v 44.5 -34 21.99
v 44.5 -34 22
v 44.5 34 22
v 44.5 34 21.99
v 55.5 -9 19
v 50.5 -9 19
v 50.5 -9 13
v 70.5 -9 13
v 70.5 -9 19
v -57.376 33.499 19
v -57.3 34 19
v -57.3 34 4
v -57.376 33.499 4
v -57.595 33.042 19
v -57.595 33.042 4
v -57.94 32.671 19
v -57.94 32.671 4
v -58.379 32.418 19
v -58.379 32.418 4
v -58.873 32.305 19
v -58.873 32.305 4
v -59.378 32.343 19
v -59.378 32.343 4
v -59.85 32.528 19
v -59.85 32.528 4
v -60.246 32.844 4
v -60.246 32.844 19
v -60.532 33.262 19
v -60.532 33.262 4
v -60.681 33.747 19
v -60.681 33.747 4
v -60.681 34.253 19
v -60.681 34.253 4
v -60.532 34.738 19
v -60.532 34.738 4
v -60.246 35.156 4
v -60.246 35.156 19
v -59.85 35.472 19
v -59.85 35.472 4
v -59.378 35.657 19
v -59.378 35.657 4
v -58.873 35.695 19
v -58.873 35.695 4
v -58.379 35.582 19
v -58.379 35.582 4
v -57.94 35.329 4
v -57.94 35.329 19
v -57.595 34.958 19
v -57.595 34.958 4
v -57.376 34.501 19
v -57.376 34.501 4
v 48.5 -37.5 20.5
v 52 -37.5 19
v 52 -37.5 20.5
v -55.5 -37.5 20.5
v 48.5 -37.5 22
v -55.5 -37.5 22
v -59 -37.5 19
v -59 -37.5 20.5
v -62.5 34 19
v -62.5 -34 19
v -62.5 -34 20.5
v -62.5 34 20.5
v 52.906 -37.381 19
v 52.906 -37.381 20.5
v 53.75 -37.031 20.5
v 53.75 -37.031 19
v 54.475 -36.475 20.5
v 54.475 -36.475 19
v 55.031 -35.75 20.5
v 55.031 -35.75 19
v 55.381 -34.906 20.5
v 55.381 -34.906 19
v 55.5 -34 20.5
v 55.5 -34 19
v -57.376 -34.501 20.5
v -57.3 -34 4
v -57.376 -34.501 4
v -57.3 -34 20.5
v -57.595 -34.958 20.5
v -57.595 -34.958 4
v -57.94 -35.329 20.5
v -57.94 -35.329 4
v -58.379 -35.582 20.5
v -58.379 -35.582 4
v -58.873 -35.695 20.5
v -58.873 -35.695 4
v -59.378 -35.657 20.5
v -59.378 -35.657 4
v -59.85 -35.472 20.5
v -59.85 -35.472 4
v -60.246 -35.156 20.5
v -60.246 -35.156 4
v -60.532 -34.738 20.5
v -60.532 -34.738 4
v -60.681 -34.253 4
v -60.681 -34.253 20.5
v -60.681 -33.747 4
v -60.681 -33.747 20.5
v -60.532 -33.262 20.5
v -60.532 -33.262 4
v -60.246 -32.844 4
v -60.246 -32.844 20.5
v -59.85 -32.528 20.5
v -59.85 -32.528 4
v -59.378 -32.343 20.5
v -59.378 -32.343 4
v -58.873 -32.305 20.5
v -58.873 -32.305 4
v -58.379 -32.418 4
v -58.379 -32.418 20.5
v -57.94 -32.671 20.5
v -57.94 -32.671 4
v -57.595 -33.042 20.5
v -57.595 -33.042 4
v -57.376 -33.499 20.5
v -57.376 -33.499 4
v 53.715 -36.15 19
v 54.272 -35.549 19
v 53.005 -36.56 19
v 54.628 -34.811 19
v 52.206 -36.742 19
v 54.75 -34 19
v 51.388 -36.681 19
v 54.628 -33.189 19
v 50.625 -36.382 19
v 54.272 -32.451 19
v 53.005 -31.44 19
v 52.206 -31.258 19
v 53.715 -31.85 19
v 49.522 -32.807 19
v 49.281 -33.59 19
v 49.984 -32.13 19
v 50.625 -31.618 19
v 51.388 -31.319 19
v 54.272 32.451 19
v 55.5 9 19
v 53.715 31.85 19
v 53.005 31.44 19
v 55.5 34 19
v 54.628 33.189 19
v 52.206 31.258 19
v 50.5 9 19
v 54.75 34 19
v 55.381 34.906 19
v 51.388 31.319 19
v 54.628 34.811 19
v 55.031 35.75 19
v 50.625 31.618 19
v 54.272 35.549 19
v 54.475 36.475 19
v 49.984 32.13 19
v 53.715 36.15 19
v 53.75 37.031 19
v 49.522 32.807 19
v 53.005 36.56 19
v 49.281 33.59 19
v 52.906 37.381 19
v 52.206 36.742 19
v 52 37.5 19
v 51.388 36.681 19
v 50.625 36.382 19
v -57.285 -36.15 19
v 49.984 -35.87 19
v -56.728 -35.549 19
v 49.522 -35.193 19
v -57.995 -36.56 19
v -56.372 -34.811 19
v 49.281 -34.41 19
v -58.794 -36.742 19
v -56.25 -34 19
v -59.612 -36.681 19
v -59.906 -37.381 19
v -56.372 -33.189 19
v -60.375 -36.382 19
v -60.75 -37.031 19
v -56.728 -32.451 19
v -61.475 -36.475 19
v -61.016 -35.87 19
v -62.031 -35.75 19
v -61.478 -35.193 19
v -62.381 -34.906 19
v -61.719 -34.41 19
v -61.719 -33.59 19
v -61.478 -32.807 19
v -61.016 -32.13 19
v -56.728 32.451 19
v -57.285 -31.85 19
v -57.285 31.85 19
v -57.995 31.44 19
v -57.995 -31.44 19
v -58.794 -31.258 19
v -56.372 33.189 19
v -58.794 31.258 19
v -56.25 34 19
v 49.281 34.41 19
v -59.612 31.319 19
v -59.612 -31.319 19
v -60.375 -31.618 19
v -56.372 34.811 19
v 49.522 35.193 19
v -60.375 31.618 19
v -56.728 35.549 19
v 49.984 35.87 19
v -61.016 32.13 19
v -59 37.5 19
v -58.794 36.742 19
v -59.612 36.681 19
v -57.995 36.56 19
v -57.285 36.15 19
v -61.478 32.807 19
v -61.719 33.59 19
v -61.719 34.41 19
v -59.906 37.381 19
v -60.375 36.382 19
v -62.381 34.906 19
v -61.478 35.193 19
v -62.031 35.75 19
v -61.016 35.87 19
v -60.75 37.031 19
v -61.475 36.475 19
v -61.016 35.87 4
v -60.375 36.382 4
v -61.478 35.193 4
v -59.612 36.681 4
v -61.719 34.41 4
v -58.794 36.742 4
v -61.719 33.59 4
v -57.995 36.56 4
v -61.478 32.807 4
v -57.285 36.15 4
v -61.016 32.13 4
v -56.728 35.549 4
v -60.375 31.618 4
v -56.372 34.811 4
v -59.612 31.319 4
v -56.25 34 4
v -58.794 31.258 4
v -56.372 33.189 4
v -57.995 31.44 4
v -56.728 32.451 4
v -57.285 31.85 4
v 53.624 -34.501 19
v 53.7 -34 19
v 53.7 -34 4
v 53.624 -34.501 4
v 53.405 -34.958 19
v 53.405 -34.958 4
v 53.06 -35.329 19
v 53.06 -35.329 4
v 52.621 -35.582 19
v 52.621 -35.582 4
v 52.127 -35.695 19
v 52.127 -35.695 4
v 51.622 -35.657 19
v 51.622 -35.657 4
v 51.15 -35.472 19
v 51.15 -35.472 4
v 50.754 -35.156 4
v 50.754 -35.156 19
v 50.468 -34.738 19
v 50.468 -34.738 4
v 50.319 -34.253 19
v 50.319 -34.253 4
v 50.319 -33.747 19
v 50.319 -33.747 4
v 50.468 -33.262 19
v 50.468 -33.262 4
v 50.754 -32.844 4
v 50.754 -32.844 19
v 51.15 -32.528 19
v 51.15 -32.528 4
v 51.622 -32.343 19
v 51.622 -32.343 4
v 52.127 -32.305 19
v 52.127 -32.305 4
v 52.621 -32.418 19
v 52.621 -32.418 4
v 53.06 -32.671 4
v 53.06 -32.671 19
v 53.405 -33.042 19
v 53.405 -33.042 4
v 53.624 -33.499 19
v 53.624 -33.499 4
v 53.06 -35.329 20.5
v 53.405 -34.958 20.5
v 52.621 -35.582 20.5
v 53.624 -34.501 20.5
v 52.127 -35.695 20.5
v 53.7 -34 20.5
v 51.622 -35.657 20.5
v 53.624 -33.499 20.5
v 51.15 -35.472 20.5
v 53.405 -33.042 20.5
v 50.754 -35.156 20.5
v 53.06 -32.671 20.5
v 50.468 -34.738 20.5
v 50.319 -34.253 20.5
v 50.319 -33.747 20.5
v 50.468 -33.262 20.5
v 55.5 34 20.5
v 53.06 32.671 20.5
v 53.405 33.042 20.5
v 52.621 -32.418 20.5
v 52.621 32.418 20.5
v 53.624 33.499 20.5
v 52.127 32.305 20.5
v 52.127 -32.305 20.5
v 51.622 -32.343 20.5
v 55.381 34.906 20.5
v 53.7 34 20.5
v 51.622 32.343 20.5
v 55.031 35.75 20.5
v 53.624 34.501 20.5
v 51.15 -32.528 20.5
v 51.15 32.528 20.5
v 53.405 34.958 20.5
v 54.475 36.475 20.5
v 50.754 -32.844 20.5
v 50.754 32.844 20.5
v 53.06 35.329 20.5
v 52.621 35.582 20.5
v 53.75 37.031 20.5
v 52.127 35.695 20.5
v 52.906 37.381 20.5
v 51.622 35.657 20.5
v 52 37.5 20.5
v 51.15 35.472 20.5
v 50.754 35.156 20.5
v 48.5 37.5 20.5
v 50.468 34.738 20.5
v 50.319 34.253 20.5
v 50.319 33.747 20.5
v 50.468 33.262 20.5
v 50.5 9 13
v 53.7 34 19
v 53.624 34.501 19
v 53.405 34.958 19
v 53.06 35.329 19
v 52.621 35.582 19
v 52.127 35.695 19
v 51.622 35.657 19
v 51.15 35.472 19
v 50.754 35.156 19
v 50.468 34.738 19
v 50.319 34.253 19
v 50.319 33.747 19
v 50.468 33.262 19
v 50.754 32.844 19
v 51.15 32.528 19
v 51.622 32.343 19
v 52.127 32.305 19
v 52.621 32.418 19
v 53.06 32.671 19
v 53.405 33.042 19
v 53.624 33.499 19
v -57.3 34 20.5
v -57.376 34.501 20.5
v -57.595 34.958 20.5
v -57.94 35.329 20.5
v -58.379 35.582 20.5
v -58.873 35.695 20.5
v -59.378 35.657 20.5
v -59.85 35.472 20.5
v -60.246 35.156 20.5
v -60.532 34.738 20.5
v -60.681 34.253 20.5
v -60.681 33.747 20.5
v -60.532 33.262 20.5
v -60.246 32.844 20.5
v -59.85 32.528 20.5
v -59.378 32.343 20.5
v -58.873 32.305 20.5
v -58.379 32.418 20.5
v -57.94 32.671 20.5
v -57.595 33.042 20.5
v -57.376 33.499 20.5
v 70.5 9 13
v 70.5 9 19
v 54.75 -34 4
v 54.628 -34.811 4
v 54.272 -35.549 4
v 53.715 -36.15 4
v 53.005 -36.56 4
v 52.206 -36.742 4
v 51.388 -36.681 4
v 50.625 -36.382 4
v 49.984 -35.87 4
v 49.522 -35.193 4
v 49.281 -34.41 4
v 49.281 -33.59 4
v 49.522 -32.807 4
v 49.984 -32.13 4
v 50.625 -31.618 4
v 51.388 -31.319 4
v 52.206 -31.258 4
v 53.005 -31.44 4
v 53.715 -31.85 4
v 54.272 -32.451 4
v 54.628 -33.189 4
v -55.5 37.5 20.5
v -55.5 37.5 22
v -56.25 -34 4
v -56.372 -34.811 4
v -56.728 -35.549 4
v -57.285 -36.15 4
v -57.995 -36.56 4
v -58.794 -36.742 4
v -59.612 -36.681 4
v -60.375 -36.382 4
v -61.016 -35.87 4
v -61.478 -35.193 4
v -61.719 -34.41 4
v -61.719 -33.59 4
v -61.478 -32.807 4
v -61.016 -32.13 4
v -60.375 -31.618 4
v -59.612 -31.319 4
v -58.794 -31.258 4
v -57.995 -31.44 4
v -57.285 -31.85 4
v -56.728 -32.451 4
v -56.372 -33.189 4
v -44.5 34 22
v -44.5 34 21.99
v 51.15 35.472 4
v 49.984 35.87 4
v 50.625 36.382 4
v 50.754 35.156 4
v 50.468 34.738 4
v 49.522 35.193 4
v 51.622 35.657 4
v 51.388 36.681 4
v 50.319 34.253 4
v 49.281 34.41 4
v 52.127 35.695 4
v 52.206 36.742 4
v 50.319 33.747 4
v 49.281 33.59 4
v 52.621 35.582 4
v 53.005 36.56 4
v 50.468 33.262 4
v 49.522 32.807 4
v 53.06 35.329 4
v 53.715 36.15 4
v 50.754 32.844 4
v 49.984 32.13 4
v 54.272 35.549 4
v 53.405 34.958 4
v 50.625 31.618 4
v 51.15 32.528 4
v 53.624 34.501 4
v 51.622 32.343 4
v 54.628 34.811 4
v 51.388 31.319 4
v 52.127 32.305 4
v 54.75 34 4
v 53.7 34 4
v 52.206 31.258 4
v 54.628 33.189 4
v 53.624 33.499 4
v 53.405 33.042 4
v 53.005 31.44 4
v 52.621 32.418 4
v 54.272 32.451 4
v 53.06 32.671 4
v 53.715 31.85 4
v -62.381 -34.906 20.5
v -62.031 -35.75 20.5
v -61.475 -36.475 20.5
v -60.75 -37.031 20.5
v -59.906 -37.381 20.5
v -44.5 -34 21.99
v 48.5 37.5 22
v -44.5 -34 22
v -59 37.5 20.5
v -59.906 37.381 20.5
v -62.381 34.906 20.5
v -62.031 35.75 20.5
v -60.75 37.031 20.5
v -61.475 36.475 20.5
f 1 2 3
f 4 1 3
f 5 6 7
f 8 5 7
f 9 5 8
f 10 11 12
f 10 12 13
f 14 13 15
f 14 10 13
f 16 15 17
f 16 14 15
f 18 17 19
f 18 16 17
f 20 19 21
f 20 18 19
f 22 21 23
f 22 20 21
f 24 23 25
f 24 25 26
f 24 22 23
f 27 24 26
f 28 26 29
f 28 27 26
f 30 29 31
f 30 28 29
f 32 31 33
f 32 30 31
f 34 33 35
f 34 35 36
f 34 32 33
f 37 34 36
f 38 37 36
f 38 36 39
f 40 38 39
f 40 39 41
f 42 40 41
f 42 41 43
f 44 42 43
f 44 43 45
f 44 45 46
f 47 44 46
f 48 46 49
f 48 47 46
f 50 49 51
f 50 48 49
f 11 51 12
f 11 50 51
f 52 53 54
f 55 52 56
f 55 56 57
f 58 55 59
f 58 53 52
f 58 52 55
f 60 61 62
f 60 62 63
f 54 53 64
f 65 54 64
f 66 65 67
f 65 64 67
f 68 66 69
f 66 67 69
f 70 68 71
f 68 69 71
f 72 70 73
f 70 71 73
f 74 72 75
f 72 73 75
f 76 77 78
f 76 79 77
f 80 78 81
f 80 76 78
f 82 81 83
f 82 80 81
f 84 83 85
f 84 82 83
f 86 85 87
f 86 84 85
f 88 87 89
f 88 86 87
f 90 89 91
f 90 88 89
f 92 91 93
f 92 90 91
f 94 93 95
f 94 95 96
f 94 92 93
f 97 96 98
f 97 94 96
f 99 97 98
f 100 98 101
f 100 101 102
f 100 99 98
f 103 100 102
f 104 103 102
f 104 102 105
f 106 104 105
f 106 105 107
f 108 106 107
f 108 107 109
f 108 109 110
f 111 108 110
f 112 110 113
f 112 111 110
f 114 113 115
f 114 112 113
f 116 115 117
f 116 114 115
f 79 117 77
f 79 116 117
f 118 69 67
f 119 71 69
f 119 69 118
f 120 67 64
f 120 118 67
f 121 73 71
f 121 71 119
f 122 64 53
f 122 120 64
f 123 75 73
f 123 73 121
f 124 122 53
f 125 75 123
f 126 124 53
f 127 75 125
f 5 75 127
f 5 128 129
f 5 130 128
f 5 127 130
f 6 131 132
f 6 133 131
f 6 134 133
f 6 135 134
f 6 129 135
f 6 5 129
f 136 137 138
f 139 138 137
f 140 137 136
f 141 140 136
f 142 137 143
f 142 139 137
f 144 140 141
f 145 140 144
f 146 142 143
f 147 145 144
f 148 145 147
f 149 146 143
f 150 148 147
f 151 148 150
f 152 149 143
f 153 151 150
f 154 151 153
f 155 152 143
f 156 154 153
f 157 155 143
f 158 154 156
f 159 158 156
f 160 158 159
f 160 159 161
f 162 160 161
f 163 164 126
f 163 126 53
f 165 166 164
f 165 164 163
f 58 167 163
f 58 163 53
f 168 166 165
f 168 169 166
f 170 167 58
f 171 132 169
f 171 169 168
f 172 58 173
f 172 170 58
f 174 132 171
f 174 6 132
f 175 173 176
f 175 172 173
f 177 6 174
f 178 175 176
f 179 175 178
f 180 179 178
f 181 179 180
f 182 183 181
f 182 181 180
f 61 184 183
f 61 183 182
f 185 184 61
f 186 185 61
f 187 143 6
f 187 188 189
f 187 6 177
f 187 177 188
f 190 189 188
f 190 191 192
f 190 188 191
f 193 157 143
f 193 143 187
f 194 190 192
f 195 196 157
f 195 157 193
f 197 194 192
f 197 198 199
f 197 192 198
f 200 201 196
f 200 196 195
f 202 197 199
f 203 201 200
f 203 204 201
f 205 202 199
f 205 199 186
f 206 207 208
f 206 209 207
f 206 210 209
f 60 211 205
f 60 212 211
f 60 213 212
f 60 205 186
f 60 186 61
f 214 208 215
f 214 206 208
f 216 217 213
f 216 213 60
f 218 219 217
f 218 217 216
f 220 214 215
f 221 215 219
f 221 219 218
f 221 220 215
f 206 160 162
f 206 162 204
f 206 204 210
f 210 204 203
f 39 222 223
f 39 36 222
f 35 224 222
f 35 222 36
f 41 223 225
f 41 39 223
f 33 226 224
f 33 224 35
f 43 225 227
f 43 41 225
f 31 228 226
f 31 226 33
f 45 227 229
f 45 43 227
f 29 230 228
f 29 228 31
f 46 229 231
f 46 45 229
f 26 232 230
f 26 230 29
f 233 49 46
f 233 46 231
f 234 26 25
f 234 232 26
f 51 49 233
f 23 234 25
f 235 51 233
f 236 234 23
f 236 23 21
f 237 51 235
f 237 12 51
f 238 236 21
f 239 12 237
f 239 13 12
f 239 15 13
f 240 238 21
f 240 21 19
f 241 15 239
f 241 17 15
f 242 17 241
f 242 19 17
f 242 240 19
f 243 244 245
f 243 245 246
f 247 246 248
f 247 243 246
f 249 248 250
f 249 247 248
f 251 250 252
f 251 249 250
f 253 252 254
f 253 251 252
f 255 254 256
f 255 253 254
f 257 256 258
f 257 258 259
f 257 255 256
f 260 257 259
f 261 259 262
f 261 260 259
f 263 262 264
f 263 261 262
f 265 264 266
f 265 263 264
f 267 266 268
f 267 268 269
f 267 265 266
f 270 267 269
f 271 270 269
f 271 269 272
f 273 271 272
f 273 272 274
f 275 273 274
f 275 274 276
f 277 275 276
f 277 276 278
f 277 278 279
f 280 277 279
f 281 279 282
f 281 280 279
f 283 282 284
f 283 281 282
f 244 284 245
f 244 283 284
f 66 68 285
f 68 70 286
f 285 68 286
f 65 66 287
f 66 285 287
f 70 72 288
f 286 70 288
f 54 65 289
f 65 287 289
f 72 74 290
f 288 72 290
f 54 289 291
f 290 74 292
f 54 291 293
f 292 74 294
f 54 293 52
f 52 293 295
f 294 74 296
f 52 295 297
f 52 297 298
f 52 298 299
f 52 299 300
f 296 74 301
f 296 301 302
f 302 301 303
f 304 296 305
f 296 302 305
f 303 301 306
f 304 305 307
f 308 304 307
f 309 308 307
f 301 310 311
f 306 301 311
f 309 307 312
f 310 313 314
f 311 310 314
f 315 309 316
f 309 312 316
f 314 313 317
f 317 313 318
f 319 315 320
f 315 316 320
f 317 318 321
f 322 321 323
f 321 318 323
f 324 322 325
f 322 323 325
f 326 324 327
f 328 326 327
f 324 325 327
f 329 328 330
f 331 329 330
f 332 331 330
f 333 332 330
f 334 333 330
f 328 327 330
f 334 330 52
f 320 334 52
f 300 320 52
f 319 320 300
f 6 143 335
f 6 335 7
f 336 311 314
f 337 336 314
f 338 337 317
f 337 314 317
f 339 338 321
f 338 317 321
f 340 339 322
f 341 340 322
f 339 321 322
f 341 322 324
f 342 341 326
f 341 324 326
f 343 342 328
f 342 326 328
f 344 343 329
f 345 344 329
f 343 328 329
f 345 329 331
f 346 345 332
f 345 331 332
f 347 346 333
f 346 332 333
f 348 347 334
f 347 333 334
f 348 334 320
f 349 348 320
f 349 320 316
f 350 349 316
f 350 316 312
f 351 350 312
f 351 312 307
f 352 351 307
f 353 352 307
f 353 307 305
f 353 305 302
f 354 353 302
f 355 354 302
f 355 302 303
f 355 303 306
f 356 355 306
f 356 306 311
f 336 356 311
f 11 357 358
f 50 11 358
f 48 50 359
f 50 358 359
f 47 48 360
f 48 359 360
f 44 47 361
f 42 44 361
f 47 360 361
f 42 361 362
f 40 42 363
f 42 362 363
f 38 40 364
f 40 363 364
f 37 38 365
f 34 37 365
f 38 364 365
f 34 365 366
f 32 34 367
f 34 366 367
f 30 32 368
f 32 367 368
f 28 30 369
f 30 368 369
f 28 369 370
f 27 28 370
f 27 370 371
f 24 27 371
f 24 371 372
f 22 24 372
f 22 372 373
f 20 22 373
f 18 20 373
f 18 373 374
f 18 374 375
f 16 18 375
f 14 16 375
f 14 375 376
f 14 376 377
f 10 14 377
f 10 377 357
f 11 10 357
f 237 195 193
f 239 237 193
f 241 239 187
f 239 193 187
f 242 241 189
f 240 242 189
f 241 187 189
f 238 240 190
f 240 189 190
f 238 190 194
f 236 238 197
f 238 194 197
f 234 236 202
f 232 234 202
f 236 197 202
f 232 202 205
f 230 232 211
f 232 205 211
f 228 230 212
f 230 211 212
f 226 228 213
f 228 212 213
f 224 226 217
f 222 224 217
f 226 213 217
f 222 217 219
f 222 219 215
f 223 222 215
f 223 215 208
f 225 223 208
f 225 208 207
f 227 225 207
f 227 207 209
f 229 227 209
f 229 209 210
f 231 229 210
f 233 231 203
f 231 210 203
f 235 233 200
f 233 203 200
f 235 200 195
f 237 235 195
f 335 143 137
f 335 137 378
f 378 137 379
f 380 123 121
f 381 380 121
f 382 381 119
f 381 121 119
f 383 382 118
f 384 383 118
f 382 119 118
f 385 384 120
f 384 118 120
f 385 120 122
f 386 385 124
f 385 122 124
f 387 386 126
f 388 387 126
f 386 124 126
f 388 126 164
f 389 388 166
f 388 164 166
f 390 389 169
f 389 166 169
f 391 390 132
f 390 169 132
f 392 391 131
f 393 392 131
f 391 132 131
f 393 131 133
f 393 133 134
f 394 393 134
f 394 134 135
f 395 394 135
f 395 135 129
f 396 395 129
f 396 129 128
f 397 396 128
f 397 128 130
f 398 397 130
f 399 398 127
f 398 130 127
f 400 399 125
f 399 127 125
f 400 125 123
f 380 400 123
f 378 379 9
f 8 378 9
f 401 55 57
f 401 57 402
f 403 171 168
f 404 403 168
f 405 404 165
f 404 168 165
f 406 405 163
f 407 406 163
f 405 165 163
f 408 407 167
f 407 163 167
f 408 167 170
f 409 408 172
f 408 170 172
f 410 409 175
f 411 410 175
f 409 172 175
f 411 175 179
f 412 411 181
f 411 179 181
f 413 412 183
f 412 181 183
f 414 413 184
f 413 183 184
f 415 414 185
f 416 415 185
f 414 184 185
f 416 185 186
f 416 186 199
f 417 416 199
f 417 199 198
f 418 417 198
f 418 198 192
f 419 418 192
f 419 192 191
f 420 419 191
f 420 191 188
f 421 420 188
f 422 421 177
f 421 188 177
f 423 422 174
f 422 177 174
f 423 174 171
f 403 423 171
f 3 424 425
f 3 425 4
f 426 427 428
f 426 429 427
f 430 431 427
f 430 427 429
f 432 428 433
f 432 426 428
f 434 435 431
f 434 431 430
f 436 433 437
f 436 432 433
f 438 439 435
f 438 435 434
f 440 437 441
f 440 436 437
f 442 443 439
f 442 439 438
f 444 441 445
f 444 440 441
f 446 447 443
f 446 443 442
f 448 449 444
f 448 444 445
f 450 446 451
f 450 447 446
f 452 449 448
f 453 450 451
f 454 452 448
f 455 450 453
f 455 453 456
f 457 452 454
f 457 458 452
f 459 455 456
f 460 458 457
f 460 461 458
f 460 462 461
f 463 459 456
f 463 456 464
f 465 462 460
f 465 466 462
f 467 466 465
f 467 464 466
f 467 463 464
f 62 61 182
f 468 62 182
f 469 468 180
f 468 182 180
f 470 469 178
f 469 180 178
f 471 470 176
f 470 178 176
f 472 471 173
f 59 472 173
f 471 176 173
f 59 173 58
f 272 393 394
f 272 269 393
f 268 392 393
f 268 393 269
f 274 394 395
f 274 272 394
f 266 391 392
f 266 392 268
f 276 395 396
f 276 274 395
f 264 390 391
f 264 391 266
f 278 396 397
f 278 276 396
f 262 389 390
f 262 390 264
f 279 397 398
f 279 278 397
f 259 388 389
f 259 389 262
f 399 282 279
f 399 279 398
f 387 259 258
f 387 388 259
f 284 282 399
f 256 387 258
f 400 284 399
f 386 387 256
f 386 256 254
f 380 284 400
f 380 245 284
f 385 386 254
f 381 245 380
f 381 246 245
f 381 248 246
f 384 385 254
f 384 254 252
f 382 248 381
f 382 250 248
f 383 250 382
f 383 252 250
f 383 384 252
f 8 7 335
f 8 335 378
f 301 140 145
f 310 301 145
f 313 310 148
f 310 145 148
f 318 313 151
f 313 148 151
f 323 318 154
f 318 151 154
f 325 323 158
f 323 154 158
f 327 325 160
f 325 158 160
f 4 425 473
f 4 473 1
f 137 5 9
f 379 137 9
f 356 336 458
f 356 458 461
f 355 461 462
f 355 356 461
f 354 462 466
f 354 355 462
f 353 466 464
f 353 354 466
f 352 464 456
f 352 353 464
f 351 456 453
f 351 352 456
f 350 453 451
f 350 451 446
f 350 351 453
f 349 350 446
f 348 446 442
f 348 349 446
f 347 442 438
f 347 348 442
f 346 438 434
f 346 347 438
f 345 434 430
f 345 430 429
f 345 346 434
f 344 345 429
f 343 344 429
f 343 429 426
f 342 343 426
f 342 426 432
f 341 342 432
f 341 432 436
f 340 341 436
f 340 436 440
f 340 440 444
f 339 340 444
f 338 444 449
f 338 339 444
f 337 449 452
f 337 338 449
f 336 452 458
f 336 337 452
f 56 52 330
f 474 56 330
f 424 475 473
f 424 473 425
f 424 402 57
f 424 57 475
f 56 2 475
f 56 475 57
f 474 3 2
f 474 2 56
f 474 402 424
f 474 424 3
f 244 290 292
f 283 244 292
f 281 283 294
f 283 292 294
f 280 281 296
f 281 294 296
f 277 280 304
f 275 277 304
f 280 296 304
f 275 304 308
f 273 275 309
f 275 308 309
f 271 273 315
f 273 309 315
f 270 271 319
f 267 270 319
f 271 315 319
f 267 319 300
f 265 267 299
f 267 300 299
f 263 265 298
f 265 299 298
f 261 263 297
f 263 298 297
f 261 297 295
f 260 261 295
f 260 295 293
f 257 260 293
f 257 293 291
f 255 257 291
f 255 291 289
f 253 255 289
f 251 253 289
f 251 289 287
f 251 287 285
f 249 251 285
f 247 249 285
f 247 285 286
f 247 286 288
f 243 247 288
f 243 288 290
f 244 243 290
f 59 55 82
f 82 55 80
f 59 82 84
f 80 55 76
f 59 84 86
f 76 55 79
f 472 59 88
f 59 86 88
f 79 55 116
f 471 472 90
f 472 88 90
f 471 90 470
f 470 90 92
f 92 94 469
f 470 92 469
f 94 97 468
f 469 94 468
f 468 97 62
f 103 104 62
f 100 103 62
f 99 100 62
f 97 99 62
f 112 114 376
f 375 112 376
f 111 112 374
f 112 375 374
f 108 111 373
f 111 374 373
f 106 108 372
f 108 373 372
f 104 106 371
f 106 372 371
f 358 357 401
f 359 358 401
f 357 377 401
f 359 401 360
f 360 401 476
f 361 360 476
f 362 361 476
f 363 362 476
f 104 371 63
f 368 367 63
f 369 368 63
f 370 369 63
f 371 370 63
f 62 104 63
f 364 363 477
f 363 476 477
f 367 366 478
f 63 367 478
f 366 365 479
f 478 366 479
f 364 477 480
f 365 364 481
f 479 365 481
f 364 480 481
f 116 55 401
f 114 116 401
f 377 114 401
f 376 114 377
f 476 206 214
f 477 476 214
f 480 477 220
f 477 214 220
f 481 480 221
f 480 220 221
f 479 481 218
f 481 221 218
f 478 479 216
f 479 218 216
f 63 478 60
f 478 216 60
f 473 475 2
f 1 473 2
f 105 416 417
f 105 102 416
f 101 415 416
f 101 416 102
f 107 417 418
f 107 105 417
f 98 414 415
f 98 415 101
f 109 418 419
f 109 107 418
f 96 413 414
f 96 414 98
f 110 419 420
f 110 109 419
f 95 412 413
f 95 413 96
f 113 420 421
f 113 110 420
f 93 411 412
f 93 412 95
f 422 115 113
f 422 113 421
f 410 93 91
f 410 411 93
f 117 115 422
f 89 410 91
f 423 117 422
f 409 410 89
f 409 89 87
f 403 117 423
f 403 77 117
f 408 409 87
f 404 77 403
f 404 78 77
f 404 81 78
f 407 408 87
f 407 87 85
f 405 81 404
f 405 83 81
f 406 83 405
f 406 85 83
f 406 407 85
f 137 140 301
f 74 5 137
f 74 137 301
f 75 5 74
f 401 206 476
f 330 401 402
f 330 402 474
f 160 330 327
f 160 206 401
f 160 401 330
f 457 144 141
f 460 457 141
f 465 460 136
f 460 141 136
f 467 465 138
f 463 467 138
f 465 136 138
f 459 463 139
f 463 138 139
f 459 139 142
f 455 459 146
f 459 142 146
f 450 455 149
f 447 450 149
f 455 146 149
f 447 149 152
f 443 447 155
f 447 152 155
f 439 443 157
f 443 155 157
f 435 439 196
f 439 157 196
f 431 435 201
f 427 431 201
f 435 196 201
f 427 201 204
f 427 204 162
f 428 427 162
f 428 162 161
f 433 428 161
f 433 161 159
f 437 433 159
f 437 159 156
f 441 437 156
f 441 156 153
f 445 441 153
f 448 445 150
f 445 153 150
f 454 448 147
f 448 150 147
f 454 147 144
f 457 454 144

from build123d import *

# Parameters (mm, degrees)
PAD012_DEPTH    = 1.5
SKETCH014_R     = 1.7
POCKET004_DEPTH = 1.501
SKETCH015_W     = 104
SKETCH015_H     = 75
PAD011_DEPTH    = 1.5
SKETCH016_W     = 89
SKETCH016_H     = 68
POCKET005_DEPTH = 0.01
SKETCH019_W     = 20
SKETCH019_H     = 18
PAD010_DEPTH    = 6
SKETCH018_R     = 2.75
SKETCH018_R_2   = 1.7
PAD009_DEPTH    = 15


with BuildPart() as part:
    # Sketch017 → Pad012 (new body)
    with BuildSketch(Plane.XY):
        with BuildLine():
            Line((3.5, 75), (114.5, 75))
            ThreePointArc((118, 71.5), (116.9748737342, 73.9748737342), (114.5, 75))
            Line((118, 71.5), (118, 3.5))
            ThreePointArc((114.5, 0), (116.9748737342, 1.0251262658), (118, 3.5))
            Line((114.5, 0), (3.5, 0))
            ThreePointArc((0, 3.5), (1.0251262658, 1.0251262658), (3.5, 0))
            Line((0, 3.5), (0, 71.5))
            ThreePointArc((3.5, 75), (1.0251262658, 73.9748737342), (0, 71.5))
        make_face()
    extrude(amount=PAD012_DEPTH)

    # Sketch014 (on Face10 of Pad012) → Pocket004 (cut, through all)
    with BuildSketch(Plane.XY.offset(1.5)):
        with Locations((3.5, 3.5)):
            Circle(SKETCH014_R)
        with Locations((3.5, 71.5)):
            Circle(SKETCH014_R)
        with Locations((114.5, 71.5)):
            Circle(SKETCH014_R)
        with Locations((114.5, 3.5)):
            Circle(SKETCH014_R)
    extrude(amount=-POCKET004_DEPTH, mode=Mode.SUBTRACT)

    # Sketch015 (on Face5 of Pocket004) → Pad011 (join)
    with BuildSketch(Plane.XY.offset(1.5)):
        with Locations((59, 37.5)):
            Rectangle(SKETCH015_W, SKETCH015_H)
    extrude(amount=PAD011_DEPTH)

    # Sketch016 (on Face19 of Pad011) → Pocket005 (cut)
    with BuildSketch(Plane.XY.offset(3)):
        with Locations((62.5, 37.5)):
            Rectangle(SKETCH016_W, SKETCH016_H)
    extrude(amount=-POCKET005_DEPTH, mode=Mode.SUBTRACT)

    # Sketch019 (on Face4 of Pocket005) → Pad010 (join)
    with BuildSketch(Plane(origin=(0, 0, 0), x_dir=(1, 0, 0), z_dir=(0, 0, -1))):
        with Locations((123, -37.5)):
            Rectangle(SKETCH019_W, SKETCH019_H)
    extrude(amount=PAD010_DEPTH)

    # Sketch018 (on Face4 of Pad010) → Pad009 (join)
    with BuildSketch(Plane(origin=(0, 0, 0), x_dir=(1, 0, 0), z_dir=(0, 0, -1))):
        with Locations((3.5, -3.5)):
            Circle(SKETCH018_R)
        with Locations((3.5, -3.5)):
            Circle(SKETCH018_R_2, mode=Mode.SUBTRACT)
        with Locations((114.5, -3.5)):
            Circle(SKETCH018_R)
        with Locations((114.5, -3.5)):
            Circle(SKETCH018_R_2, mode=Mode.SUBTRACT)
        with Locations((114.5, -71.5)):
            Circle(SKETCH018_R)
        with Locations((114.5, -71.5)):
            Circle(SKETCH018_R_2, mode=Mode.SUBTRACT)
        with Locations((3.5, -71.5)):
            Circle(SKETCH018_R)
        with Locations((3.5, -71.5)):
            Circle(SKETCH018_R_2, mode=Mode.SUBTRACT)
    extrude(amount=PAD009_DEPTH)


with BuildPart() as part_1:
    # Body002 placement: moved
    add(part.part.moved(Location((-62.5, -37.5, 19))))


solid = part_1.part
